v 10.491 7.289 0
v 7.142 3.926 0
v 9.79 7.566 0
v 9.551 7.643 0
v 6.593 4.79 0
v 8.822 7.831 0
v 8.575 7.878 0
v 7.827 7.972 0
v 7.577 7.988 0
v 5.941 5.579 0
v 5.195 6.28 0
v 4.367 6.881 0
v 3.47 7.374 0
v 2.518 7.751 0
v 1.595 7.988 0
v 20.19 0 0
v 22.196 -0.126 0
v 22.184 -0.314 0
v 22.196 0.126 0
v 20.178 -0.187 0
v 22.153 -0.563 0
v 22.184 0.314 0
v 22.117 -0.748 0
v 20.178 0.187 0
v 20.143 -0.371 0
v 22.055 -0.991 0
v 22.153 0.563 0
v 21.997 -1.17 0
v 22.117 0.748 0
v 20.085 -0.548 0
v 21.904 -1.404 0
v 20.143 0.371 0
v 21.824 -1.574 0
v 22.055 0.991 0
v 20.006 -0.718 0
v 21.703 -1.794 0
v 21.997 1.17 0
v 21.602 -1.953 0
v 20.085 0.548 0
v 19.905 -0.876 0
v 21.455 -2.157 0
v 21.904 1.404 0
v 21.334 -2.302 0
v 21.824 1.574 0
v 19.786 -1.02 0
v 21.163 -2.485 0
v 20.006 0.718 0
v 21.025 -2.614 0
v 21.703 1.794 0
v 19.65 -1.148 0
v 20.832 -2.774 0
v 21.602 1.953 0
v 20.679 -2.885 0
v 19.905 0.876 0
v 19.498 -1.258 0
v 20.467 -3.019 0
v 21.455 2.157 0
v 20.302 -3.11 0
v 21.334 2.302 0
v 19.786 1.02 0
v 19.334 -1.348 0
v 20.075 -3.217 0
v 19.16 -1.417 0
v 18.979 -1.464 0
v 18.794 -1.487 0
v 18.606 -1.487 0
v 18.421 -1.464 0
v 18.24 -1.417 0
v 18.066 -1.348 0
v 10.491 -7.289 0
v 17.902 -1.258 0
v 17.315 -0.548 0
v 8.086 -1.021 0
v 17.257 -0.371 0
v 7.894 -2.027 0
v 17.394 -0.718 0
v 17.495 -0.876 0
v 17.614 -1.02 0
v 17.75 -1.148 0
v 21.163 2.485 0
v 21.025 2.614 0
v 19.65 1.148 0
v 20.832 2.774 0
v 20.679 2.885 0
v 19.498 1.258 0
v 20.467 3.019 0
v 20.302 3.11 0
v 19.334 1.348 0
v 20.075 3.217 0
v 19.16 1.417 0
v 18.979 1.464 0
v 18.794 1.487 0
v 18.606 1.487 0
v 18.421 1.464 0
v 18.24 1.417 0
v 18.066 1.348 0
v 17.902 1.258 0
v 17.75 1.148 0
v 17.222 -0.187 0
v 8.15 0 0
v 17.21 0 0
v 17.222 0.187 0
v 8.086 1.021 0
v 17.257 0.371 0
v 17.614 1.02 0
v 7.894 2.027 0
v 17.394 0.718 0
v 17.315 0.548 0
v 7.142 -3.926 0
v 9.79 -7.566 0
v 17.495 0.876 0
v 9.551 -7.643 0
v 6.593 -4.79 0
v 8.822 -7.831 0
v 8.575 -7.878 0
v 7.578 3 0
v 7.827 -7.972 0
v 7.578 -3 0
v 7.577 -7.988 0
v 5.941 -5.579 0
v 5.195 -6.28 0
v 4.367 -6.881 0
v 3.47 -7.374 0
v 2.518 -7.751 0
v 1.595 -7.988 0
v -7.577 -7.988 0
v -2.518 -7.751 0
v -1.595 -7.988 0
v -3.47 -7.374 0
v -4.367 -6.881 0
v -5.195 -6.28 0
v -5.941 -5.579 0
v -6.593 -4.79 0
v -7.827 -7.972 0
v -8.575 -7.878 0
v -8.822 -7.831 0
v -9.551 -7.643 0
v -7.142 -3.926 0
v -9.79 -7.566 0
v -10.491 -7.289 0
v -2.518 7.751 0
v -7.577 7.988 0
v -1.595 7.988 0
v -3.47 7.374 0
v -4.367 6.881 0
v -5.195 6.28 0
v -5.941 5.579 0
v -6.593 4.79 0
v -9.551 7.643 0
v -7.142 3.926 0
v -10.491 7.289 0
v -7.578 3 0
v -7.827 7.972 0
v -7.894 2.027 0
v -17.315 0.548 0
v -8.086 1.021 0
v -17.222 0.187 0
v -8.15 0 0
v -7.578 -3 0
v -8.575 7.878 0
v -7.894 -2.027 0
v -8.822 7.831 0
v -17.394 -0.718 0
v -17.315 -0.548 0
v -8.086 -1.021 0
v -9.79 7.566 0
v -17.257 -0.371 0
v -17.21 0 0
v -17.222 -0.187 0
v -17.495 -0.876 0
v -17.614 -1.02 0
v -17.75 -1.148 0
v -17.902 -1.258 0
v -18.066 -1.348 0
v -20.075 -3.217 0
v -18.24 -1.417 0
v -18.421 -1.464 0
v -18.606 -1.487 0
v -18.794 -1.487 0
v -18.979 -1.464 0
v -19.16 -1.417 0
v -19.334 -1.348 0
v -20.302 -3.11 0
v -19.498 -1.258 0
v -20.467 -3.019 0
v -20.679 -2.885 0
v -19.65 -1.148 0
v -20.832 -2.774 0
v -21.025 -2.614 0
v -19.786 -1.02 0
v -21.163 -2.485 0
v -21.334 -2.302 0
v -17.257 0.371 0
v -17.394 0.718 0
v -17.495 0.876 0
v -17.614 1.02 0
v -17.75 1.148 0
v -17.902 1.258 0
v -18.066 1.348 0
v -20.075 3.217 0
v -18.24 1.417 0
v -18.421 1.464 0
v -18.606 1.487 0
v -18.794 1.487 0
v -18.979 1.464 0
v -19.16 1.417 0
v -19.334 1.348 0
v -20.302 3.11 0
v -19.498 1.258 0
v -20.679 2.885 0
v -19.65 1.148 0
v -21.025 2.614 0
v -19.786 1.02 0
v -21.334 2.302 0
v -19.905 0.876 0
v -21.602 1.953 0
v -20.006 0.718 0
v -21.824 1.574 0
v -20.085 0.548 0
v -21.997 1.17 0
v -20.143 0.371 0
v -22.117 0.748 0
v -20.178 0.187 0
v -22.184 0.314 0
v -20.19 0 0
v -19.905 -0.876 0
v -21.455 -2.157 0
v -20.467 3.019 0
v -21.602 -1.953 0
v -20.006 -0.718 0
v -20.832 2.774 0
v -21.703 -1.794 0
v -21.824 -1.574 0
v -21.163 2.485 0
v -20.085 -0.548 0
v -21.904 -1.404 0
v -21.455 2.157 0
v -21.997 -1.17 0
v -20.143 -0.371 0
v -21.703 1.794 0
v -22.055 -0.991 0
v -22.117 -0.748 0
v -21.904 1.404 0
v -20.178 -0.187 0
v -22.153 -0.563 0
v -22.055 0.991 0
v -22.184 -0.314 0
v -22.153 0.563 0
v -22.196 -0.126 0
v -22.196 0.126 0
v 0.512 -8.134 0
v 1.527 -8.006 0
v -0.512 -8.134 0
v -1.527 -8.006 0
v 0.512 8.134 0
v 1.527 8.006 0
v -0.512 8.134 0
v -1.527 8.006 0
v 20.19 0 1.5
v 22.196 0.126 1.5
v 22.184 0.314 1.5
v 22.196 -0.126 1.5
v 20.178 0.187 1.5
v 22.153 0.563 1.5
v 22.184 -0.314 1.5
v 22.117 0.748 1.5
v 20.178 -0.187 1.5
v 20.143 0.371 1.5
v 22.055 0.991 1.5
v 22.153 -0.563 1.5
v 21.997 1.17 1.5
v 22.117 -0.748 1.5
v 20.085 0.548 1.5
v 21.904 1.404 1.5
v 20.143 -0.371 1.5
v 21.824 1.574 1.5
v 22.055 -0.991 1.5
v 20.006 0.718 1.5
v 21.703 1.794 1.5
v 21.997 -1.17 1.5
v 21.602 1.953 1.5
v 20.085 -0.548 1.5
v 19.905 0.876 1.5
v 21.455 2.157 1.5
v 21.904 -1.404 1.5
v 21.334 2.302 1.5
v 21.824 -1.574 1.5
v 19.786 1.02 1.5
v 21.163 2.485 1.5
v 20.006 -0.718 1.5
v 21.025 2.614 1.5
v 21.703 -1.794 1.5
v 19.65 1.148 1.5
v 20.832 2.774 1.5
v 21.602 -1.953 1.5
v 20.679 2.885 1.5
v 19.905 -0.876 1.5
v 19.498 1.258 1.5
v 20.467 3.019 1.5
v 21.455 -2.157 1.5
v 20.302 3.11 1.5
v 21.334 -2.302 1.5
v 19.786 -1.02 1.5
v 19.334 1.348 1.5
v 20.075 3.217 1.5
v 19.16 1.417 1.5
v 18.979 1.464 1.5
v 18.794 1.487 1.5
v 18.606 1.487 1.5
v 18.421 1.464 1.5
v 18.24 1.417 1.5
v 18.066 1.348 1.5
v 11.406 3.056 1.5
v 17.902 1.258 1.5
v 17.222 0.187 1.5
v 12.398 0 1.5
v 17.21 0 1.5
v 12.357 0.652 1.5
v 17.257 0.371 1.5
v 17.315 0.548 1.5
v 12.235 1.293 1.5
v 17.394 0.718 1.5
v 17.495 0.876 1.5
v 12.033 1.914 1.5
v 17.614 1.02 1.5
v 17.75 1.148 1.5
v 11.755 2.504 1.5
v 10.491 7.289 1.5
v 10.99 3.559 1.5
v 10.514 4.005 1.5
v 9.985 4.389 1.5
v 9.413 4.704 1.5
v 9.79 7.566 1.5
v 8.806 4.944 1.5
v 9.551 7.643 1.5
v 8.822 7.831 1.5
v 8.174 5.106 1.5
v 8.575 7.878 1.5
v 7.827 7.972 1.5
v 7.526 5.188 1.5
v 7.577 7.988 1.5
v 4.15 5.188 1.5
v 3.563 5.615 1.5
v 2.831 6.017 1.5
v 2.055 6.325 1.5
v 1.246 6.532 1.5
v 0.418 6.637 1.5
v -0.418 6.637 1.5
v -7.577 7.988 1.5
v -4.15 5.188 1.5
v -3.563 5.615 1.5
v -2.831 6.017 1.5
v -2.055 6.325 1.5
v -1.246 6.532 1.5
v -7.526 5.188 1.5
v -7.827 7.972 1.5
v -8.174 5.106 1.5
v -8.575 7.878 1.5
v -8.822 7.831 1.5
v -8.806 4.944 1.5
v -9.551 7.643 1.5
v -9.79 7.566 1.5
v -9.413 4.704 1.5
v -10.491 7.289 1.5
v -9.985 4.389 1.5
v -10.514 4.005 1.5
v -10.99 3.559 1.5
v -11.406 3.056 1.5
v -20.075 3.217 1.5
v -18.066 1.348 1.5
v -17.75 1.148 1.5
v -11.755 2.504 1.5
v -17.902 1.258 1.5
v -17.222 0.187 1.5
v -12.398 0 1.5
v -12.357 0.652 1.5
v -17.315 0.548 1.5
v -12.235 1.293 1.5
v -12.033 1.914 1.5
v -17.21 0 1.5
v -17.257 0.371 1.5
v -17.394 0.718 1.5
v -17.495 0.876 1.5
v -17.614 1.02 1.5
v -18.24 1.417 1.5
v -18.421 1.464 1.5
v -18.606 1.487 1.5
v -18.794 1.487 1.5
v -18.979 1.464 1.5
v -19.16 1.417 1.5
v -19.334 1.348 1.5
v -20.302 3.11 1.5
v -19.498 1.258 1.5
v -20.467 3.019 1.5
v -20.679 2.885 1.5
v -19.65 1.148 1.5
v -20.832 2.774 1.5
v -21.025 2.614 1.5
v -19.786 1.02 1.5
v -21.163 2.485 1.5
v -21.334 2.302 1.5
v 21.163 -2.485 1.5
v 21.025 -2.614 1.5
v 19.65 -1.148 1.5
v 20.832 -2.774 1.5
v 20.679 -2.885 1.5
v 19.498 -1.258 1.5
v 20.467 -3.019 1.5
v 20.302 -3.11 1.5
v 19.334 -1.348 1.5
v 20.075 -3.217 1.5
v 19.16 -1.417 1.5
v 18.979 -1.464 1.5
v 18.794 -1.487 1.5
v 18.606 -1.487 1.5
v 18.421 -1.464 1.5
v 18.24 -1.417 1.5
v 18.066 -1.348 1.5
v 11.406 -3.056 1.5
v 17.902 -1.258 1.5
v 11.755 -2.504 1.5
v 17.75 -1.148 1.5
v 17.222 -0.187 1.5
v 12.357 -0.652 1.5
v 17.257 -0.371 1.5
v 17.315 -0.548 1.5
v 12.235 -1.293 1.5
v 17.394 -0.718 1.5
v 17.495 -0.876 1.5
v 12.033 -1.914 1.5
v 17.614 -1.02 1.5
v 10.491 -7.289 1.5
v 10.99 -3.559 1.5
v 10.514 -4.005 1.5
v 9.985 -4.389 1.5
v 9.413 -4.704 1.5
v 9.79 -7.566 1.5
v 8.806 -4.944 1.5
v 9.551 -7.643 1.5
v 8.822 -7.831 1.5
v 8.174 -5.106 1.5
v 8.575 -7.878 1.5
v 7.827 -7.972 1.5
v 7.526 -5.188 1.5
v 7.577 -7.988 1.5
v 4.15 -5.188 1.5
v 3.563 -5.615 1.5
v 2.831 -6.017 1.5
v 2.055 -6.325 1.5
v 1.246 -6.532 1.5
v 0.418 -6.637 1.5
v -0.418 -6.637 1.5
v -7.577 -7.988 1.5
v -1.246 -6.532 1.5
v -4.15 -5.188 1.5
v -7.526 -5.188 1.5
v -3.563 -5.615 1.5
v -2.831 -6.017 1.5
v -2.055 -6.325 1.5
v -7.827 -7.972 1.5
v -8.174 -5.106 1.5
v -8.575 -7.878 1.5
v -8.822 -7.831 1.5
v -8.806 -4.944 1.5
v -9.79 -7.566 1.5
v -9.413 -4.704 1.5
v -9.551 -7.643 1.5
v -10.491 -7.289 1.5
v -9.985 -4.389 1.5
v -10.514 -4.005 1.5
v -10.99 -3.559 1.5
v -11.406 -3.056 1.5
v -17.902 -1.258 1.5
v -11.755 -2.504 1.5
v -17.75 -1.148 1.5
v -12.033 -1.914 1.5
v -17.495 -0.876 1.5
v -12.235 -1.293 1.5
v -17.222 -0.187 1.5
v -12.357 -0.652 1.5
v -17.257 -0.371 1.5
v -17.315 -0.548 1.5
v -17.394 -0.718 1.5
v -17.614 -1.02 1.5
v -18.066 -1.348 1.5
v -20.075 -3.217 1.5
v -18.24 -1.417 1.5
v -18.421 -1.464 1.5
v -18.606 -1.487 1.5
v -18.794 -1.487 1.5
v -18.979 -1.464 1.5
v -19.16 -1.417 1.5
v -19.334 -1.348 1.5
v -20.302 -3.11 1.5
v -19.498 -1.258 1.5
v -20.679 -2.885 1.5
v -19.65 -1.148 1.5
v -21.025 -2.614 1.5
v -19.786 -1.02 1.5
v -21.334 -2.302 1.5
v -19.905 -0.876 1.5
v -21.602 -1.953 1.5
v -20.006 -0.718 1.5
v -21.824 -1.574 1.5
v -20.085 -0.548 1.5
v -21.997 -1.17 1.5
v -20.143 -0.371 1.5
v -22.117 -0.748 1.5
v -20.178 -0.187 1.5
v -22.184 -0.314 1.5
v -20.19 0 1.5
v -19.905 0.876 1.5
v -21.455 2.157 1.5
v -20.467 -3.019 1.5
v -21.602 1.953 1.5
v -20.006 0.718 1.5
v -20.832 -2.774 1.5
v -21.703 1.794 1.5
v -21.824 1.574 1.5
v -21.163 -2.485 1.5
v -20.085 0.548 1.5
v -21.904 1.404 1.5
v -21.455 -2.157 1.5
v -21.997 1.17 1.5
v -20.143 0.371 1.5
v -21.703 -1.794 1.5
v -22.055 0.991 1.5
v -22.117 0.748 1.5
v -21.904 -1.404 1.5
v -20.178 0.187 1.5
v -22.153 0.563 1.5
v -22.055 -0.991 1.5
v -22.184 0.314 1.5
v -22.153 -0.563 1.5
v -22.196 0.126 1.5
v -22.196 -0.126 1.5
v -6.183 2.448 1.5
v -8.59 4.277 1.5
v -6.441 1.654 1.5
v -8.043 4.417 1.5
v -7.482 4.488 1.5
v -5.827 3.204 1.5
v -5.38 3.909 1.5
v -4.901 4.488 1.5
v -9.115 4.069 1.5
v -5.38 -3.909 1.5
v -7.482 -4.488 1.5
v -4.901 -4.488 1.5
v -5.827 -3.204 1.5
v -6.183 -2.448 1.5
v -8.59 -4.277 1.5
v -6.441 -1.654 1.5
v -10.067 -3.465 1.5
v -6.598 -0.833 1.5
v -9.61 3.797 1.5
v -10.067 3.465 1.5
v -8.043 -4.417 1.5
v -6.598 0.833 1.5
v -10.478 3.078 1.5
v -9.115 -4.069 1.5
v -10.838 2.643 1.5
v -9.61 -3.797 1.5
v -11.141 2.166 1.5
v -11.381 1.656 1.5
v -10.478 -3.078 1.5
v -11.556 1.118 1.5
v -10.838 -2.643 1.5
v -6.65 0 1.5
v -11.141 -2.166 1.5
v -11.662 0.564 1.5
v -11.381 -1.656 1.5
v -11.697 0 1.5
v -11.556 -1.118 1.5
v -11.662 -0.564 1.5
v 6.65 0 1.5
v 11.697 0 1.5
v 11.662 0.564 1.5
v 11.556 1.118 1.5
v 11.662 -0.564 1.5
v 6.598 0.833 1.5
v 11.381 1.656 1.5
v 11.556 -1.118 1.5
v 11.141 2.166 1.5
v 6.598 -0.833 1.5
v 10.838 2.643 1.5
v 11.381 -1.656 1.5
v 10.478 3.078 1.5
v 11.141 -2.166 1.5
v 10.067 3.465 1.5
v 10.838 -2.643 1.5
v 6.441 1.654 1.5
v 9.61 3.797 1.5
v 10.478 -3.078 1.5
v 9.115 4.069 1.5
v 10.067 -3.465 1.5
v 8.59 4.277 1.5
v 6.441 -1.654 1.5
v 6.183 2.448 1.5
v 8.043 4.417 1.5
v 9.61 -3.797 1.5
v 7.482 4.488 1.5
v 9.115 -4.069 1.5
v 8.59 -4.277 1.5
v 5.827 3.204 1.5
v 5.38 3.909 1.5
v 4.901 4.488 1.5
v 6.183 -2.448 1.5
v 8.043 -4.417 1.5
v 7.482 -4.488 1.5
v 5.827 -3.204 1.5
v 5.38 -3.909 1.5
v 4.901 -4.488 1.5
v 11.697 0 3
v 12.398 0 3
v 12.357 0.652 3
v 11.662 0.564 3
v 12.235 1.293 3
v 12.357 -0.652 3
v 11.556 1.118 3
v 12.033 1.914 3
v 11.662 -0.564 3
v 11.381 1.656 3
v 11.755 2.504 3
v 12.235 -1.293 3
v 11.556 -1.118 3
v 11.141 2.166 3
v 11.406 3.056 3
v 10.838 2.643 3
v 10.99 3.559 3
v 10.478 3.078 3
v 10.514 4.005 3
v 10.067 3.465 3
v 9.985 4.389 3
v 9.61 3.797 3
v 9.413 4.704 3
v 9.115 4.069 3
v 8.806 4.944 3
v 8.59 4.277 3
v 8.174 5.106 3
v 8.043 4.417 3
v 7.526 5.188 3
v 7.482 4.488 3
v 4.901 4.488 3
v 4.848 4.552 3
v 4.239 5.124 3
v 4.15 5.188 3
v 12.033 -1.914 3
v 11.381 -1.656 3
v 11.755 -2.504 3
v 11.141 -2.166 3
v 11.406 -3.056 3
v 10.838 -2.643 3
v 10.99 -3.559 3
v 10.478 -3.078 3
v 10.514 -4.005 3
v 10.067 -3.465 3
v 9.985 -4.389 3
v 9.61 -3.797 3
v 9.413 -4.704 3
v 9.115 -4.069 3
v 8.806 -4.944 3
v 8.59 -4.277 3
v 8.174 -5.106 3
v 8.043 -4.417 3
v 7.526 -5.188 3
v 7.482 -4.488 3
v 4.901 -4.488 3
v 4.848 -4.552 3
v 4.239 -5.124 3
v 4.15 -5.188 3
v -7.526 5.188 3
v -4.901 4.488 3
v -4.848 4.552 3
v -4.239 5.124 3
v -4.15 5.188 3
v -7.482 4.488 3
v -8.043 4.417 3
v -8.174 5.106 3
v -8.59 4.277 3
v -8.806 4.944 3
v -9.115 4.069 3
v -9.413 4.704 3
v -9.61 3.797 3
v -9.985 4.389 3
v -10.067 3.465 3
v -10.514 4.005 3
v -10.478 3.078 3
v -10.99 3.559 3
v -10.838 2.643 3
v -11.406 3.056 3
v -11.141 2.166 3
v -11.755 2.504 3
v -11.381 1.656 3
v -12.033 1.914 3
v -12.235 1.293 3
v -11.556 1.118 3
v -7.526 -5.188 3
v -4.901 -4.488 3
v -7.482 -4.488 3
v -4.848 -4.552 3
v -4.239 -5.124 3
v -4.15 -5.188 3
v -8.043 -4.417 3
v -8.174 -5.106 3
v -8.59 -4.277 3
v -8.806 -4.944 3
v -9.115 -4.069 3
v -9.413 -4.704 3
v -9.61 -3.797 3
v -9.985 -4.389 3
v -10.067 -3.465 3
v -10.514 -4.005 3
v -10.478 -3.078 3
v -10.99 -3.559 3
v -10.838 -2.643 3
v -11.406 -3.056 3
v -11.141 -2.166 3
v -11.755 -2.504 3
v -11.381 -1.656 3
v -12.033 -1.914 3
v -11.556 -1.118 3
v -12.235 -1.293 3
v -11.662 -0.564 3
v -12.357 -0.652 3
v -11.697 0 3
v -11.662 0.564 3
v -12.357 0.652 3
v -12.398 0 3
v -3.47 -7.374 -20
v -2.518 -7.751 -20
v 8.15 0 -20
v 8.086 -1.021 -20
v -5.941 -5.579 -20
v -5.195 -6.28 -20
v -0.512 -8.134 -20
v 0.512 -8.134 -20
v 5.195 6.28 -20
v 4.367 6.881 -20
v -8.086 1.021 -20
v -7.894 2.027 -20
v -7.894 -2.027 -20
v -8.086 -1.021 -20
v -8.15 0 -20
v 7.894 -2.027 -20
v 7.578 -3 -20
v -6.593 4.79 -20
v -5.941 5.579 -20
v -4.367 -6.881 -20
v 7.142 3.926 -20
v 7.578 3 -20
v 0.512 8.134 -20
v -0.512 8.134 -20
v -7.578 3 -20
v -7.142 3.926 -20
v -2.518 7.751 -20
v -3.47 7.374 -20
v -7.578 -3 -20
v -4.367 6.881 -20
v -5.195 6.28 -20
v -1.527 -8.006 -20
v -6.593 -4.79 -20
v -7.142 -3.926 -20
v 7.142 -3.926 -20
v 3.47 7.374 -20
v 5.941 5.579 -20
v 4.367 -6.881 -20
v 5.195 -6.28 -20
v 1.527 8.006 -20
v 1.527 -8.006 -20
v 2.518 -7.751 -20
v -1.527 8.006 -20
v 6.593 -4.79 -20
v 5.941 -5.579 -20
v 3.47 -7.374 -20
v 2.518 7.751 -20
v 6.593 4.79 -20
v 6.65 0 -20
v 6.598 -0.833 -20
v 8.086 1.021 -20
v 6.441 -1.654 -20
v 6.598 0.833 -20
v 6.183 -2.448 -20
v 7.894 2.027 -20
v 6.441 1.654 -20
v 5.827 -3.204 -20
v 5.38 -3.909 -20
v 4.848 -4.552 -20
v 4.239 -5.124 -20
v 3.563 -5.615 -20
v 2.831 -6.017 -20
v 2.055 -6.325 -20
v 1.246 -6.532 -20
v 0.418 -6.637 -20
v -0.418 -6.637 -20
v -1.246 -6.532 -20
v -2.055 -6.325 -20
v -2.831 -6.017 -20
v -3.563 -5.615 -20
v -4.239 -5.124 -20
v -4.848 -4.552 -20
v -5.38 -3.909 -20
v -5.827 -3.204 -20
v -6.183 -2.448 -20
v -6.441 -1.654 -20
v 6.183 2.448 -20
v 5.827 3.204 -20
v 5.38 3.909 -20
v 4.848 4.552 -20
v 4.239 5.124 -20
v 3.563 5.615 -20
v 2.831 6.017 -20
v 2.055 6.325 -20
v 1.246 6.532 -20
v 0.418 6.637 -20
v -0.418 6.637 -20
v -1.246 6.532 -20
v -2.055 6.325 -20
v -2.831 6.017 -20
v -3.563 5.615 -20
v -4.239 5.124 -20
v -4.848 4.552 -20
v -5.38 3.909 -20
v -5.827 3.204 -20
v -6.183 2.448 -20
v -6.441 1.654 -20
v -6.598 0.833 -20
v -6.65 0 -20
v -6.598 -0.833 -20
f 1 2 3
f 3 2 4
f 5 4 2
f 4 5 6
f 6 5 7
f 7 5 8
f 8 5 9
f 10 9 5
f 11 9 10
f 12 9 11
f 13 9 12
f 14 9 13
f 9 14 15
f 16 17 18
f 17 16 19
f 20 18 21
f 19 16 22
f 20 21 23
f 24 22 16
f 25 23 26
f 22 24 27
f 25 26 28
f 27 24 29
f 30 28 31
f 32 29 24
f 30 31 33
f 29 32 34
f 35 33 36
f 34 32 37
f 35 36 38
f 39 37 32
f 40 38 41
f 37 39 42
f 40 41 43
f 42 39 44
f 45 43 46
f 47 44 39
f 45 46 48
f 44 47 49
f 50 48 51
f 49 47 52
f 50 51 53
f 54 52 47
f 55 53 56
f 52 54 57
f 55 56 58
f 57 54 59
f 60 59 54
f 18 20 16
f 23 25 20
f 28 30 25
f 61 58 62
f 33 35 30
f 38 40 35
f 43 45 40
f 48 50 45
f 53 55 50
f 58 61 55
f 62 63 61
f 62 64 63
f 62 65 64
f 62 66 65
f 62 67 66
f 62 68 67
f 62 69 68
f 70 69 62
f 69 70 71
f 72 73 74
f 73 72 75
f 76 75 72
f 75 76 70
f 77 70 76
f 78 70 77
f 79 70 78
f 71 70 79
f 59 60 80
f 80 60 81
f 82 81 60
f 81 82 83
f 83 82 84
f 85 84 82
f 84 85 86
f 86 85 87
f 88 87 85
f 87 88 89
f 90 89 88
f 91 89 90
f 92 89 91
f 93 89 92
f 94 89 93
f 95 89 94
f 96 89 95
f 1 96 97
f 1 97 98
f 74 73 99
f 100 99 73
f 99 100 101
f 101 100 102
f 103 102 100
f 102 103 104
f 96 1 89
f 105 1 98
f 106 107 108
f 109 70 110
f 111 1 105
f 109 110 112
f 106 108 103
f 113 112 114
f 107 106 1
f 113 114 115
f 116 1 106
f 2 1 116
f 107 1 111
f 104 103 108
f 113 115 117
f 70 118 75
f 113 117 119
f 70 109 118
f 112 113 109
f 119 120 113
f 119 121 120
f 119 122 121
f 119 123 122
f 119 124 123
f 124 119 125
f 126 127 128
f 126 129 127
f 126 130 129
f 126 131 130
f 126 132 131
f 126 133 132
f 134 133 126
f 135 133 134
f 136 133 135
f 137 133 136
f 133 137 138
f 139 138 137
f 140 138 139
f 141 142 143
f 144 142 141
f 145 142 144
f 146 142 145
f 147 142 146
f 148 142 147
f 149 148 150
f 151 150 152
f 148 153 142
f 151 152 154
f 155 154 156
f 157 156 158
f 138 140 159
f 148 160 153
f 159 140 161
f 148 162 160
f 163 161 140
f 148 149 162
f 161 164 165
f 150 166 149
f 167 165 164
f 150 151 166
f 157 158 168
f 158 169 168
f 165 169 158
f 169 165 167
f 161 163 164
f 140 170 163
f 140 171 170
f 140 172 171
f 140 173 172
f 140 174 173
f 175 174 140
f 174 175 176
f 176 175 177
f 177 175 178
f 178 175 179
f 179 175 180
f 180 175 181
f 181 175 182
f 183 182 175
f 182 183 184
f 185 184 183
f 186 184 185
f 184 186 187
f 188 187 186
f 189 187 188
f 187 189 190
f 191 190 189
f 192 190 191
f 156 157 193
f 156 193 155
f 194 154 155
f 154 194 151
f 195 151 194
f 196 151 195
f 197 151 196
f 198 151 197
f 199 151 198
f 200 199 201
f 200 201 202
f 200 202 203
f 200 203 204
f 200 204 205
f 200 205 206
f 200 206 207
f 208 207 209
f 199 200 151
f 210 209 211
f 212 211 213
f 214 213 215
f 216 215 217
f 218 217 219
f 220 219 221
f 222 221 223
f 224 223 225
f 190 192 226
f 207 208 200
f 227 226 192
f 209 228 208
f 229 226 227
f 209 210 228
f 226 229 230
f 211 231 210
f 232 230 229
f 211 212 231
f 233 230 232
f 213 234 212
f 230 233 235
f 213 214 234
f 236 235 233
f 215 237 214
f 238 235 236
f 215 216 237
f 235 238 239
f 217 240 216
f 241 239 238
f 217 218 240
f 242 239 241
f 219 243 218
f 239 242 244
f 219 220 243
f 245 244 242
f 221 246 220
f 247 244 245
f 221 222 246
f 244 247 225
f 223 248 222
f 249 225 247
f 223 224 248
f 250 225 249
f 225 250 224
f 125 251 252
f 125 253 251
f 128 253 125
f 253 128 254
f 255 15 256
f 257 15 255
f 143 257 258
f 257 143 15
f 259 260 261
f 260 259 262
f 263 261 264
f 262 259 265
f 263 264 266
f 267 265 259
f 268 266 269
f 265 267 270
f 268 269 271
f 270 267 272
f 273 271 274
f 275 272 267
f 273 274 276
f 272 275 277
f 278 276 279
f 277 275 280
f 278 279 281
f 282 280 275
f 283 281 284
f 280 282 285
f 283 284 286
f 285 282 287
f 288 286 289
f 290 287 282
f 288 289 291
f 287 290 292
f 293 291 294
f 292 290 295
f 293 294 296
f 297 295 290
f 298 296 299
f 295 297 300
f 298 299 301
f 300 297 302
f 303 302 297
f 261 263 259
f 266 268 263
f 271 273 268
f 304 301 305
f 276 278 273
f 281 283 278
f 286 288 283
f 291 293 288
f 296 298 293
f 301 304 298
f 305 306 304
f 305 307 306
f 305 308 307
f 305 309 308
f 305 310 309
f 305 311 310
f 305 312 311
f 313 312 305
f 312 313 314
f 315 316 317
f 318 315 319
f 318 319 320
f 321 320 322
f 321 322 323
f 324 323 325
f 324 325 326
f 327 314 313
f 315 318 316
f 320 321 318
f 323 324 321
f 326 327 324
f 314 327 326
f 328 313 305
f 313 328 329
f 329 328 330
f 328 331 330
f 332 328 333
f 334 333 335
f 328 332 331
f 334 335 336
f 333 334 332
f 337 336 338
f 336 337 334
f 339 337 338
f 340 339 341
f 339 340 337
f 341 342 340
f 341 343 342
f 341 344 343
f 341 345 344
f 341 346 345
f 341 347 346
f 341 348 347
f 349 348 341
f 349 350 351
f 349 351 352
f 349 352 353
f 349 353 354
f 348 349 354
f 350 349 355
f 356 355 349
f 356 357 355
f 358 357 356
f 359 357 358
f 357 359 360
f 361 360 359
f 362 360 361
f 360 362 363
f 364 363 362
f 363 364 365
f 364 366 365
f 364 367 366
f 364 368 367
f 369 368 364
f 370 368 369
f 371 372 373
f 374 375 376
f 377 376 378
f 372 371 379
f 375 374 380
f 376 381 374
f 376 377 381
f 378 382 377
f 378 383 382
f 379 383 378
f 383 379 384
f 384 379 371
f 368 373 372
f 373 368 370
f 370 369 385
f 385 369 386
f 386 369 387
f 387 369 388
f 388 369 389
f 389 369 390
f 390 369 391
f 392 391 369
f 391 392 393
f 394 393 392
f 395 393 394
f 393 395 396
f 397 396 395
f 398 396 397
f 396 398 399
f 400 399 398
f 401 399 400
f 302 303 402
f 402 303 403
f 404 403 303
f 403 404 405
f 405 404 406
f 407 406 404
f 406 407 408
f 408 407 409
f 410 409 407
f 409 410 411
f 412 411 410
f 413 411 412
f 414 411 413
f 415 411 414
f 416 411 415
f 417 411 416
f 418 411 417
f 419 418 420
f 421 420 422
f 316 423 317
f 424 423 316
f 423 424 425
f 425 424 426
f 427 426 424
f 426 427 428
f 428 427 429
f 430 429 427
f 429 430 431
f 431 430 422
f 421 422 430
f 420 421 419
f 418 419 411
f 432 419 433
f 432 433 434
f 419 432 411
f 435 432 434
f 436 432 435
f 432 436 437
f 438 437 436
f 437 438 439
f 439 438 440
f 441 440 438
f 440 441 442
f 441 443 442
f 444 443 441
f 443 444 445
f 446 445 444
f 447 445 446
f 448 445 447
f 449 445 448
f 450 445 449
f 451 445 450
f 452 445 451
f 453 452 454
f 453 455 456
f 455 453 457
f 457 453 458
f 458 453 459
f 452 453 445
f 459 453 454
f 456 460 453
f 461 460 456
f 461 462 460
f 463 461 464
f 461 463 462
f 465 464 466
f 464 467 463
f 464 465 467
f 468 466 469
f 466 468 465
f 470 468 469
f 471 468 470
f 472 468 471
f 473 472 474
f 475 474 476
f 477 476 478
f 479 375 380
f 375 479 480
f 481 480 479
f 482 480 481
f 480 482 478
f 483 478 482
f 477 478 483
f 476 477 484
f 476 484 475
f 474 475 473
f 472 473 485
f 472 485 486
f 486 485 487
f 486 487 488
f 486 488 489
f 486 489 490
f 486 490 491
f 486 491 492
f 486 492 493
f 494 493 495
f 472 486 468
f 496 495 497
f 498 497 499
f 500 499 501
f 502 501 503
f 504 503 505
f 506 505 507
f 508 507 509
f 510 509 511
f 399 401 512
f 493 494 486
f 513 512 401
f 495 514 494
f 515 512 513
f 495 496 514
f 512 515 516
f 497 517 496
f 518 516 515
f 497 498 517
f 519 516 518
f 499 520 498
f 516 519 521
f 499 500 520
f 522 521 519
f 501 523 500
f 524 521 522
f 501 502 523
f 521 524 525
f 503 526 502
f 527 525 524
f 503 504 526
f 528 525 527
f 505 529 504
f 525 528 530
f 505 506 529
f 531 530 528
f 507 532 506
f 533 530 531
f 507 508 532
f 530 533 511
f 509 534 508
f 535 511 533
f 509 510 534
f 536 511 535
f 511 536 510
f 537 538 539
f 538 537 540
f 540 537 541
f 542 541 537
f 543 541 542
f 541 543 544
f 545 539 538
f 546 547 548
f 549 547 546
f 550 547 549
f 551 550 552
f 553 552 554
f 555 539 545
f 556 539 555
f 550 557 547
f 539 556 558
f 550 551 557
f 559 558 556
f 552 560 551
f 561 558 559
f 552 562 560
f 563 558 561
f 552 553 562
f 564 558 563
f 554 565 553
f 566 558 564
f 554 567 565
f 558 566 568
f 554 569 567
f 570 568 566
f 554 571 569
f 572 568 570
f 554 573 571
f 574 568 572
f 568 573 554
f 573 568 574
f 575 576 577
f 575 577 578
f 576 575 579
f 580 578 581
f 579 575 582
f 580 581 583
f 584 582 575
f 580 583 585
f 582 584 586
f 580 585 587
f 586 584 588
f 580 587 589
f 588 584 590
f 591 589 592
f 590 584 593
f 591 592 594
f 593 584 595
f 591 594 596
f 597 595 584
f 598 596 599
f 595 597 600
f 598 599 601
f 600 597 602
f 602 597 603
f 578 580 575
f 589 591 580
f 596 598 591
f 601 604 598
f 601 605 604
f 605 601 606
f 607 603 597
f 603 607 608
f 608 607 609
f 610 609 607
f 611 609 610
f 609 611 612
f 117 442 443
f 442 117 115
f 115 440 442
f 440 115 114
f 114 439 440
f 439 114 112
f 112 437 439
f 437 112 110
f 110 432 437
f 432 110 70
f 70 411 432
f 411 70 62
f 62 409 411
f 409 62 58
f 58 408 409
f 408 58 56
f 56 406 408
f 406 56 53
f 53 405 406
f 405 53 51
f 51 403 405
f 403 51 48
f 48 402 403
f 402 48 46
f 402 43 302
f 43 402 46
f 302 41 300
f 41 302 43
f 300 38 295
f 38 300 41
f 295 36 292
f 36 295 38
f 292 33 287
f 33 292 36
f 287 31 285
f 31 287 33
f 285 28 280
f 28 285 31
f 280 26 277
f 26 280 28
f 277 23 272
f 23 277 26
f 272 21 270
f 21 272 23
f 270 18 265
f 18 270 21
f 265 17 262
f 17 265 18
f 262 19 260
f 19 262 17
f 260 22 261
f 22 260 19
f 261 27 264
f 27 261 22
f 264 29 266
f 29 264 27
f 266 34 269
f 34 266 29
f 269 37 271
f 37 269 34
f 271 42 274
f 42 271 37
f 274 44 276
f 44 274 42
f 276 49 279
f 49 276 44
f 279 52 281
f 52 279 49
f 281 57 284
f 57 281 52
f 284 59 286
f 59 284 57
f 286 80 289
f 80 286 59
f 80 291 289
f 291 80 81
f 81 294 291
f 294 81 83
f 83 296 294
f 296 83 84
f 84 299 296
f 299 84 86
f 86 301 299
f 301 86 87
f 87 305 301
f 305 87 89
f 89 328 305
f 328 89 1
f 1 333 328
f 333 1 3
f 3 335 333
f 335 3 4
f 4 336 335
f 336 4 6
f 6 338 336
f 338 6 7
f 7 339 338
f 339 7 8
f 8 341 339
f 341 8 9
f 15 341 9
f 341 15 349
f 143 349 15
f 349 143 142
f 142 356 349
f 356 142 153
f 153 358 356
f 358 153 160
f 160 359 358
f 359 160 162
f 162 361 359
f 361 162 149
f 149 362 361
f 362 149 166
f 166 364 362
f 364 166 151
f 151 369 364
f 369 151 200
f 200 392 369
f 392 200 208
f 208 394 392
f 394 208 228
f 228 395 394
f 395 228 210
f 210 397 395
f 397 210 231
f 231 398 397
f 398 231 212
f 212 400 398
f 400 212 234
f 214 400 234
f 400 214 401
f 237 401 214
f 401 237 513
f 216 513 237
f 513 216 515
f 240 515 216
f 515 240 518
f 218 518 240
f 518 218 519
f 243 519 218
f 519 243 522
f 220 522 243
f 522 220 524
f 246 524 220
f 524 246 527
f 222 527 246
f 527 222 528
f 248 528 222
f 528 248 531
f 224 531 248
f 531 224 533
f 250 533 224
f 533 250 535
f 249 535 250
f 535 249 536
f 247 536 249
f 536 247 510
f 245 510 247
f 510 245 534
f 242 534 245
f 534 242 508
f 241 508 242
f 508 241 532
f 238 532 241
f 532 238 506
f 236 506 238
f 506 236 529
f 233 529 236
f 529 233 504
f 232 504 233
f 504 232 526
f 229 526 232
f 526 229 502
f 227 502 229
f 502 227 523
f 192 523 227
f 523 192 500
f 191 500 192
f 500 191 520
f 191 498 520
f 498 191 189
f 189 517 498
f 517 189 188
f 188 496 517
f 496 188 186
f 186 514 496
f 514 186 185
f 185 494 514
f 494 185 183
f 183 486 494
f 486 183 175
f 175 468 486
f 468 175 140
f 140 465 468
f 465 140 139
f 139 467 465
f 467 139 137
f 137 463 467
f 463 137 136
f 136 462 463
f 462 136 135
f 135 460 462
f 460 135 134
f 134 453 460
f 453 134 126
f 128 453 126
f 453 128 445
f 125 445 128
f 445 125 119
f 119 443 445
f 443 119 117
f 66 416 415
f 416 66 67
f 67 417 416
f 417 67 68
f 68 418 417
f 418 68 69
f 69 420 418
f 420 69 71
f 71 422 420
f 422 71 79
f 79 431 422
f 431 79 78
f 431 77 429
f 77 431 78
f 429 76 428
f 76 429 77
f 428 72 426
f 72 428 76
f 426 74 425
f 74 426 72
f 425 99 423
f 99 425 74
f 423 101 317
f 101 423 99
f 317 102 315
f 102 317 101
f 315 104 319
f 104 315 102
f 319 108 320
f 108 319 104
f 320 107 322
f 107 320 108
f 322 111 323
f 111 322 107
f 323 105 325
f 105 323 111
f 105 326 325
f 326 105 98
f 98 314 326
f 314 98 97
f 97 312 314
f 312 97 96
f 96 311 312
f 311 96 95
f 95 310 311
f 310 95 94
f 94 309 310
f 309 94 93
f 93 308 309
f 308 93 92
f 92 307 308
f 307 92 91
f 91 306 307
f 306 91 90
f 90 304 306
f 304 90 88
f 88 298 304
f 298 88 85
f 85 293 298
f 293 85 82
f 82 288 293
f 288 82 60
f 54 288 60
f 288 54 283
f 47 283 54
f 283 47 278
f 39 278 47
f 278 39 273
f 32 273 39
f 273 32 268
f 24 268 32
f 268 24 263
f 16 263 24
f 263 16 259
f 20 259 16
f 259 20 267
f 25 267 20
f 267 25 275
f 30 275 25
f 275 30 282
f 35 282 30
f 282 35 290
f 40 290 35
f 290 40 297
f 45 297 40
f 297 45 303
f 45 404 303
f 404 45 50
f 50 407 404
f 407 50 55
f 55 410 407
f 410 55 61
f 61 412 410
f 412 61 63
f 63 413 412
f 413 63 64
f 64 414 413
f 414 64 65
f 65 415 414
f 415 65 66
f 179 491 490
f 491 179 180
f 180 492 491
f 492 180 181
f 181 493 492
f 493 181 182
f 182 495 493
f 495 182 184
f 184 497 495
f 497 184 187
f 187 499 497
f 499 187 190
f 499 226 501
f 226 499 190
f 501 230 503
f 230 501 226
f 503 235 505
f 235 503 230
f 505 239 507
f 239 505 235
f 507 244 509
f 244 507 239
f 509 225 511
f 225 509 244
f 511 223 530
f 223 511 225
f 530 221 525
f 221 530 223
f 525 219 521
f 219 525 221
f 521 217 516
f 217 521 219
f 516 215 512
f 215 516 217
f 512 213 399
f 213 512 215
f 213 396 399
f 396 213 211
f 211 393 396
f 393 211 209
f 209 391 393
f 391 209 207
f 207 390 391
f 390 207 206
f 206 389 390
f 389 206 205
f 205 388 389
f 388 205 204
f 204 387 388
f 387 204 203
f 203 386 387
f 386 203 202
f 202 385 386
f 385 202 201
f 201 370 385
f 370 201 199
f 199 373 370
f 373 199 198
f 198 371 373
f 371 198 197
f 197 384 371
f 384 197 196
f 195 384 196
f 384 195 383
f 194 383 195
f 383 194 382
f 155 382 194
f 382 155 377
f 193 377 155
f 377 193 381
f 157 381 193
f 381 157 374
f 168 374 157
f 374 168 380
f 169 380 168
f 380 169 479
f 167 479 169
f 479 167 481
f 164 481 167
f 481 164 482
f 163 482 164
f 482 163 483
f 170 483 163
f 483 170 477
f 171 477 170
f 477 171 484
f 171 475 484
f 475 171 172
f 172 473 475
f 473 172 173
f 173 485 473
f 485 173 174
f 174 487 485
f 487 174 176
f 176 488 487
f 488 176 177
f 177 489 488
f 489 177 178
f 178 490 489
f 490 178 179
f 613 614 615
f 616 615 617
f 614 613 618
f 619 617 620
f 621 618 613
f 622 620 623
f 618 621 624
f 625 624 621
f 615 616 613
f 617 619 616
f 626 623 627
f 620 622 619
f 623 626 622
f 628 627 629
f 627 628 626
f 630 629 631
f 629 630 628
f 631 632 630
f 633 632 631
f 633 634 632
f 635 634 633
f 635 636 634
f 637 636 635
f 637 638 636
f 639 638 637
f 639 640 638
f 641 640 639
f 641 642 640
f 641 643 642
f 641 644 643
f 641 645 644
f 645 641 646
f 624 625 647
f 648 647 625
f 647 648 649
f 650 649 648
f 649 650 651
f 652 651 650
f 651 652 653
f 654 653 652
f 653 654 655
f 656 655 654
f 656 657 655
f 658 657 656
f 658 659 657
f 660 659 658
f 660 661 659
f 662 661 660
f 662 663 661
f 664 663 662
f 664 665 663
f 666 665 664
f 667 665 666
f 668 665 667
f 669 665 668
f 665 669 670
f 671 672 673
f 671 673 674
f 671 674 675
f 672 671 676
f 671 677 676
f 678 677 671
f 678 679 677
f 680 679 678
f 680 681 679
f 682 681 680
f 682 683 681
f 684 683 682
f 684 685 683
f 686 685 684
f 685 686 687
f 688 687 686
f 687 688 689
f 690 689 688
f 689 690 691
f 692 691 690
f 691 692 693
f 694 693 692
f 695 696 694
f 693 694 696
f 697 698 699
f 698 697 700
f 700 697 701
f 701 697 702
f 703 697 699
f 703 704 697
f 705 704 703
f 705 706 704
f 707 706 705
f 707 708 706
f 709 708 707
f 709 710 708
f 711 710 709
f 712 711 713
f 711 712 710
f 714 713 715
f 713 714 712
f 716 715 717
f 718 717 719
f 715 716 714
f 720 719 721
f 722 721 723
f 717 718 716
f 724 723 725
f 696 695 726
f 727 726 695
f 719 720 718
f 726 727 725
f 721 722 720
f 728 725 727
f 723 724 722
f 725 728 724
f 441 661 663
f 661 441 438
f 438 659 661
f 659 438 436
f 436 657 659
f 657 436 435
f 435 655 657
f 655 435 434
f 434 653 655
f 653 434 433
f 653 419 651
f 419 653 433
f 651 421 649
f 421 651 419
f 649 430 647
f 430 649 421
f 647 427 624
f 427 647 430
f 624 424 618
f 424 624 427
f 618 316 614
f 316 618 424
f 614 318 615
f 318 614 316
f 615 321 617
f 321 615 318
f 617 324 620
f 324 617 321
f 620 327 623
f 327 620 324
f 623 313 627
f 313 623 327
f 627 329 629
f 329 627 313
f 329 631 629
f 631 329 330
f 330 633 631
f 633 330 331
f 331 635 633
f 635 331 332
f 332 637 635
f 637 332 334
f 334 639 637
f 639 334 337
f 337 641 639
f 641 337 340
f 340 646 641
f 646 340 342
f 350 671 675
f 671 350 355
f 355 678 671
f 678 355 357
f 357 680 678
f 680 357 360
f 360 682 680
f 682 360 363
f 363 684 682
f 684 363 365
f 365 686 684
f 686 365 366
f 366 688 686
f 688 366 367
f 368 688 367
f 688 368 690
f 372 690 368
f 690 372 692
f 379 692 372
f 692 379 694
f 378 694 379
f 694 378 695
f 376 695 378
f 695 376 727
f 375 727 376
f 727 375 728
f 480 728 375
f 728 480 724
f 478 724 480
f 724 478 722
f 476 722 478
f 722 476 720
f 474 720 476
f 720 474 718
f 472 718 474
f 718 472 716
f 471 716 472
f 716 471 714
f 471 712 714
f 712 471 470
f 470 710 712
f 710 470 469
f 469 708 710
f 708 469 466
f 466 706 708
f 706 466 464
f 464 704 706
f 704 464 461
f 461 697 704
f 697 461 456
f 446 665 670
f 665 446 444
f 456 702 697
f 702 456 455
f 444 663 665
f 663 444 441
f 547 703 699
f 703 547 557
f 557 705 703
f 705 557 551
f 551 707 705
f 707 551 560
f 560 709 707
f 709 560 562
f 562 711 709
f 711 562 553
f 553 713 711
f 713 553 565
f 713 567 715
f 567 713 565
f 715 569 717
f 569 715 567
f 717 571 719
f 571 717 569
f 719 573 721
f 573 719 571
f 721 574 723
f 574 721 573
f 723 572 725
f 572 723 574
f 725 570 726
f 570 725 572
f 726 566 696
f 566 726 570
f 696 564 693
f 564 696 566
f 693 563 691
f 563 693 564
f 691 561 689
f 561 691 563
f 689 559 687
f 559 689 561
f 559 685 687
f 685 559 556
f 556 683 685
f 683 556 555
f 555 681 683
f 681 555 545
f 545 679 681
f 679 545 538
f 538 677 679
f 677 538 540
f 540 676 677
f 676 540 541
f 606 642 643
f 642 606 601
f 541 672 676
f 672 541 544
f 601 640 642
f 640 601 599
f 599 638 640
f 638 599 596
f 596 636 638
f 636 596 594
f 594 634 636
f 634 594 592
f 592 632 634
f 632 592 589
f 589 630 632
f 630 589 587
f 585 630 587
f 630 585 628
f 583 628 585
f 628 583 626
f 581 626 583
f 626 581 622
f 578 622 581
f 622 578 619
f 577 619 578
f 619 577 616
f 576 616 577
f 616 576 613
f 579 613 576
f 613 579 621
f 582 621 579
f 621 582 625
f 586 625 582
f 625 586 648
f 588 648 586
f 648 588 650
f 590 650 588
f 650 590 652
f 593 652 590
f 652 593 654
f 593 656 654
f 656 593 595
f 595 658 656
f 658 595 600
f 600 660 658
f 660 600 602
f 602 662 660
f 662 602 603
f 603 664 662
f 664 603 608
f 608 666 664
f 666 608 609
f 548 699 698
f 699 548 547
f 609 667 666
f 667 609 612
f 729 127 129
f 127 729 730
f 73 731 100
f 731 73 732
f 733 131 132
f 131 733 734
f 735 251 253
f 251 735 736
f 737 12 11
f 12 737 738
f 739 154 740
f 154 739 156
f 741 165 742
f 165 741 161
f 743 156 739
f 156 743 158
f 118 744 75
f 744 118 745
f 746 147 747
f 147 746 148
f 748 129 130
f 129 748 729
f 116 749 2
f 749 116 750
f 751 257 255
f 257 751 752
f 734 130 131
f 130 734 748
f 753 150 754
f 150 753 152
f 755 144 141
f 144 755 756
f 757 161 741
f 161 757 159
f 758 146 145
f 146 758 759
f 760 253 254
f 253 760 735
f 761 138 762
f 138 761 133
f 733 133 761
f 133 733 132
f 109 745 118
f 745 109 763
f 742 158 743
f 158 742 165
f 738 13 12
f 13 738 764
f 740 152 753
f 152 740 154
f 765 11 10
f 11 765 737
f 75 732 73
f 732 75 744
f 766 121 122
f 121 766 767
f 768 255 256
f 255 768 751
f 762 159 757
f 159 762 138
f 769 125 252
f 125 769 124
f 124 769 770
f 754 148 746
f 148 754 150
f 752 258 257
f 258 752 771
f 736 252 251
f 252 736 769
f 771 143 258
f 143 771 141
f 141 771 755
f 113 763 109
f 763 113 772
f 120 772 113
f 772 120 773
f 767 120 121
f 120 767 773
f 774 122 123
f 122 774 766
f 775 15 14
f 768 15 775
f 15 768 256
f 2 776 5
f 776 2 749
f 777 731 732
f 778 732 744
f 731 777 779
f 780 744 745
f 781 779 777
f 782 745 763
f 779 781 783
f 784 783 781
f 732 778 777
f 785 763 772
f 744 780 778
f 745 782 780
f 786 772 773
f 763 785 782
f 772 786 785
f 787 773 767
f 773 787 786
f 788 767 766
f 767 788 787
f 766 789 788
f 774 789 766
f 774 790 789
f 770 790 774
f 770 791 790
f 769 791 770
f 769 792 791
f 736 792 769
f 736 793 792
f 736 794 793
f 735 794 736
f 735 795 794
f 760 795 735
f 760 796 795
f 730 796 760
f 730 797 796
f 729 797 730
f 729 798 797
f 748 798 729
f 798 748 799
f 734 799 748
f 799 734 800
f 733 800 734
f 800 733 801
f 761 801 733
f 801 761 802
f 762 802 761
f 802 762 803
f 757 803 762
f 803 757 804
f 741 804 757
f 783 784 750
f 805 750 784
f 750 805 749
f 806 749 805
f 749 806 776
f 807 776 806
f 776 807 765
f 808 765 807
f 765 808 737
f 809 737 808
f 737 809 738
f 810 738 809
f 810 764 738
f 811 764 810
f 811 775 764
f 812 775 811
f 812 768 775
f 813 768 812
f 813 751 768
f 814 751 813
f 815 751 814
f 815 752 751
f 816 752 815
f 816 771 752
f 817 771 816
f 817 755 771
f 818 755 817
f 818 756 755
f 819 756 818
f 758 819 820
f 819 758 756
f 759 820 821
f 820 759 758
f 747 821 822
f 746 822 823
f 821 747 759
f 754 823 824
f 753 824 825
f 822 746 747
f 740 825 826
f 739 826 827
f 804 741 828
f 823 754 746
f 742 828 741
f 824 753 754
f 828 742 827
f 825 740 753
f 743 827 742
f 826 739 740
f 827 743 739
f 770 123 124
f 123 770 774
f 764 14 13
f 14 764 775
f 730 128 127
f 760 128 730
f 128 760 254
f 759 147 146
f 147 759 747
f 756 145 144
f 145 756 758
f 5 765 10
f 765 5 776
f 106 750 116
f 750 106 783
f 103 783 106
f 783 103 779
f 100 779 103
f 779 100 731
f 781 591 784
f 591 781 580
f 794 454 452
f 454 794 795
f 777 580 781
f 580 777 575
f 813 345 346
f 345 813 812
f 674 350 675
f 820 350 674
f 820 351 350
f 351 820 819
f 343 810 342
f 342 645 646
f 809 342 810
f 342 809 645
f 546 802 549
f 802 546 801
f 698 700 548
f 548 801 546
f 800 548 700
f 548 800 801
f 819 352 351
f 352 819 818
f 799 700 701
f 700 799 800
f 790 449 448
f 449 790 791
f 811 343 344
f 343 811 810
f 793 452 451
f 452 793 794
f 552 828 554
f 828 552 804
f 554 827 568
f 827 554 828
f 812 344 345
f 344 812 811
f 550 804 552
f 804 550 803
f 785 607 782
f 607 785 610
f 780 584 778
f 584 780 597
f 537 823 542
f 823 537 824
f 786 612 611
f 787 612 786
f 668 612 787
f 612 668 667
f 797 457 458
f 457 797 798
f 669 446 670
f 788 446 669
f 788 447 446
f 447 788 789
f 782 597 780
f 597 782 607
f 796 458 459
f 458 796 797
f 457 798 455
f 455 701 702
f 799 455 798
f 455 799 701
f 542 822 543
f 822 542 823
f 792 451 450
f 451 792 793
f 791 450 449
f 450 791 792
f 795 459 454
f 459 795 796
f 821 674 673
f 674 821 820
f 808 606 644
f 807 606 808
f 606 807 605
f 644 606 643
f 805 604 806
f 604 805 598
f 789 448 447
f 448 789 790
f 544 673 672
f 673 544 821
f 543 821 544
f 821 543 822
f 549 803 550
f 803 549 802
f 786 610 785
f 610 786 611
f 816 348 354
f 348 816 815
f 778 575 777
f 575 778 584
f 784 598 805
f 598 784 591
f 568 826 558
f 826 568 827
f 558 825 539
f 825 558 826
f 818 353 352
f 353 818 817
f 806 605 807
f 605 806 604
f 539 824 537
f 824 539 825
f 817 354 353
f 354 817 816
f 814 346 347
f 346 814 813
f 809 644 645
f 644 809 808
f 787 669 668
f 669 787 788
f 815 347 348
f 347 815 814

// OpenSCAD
// file: vacuum seal.scad
include <config.scad>
use <box.scad>


module __vacuum_seal_slot() {
    spacing = vacuum_hole_diameter * 0.6;
    hull() {
        translate([-spacing, 0, 0]) {
            circle(d = vacuum_hole_diameter);
        }
        translate([spacing, 0, 0]) {
            circle(d = vacuum_hole_diameter);
        }
    }
}

module __vacuum_seal_outline() {
    spacing = vacuum_hole_diameter * 0.6;
    screw_spacing = spacing + vacuum_hole_diameter / 2 + bolt_head_clearance / 2 + 2;
    difference() {
        hull() {
            offset(2) {
                __vacuum_hole_outline();
            }
        }
        translate([screw_spacing, 0, 0]) {
            circle(d = bolt_diameter - 0.02);
        }
        translate([-screw_spacing, 0, 0]) {
            circle(d = bolt_diameter - 0.02);
        }
    }
}

module __vacuum_seal_lip() {
    spacing = vacuum_hole_diameter * 0.6;
    
    linear_extrude(3) {
        difference() {
            offset(-0.8) {
                __vacuum_seal_slot();
            }
            offset(-1.5) {
                __vacuum_seal_slot();
            }
            
        }
    }
}


module vacuum_seal() {
    linear_extrude(1.5) {
        __vacuum_seal_outline();
    }
    
    __vacuum_seal_lip();
}

vacuum_seal();
// file: box.scad
include <config.scad>
include <common.scad>


module __box_outline(size) {
    size = size == undef ? box_size : size;
    __fillet(r=fillet_radius) {
         square([size.x, size.y]);
    }
}


module __bolt_holes_outline(d, size) {
    size = size == undef ? box_size : size;
    translate([screw_post_inset, screw_post_inset]) {
        circle(d = d);
    }
    translate([size.x - screw_post_inset, screw_post_inset]) {
        circle(d = d);
    }
    translate([size.x - screw_post_inset, size.y - screw_post_inset]) {
        circle(d = d);
    }
    translate([screw_post_inset, size.y - screw_post_inset]) {
        circle(d = d);
    }
}

module __vacuum_hole_bolts_outline() {
    spacing = vacuum_hole_diameter * 0.6;
    screw_spacing = spacing + vacuum_hole_diameter / 2 + bolt_head_clearance / 2 + 2;

    translate([screw_spacing, 0, 0]) {
        circle(d = bolt_diameter);
    }
    translate([-screw_spacing, 0, 0]) {
        circle(d = bolt_diameter);
    }
}

module __vacuum_hole_outline() {
    spacing = vacuum_hole_diameter * 0.6;

    hull() {
        translate([-spacing, 0, 0]) {
            circle(d = vacuum_hole_diameter);
        }
        translate([spacing, 0, 0]) {
            circle(d = vacuum_hole_diameter);
        }
    }

    __vacuum_hole_bolts_outline();
}

module __vacuum_hole() {
    translate([box_size.x / 2, 0, box_size.z / 2]) {
        rotate([90, 0, 0]) {
            linear_extrude(wall_thickness * 2 + 0.04, center=true) {
                __vacuum_hole_outline();
            }
        }
    }
}

module __vacuum_holes() {
    __vacuum_hole();
    translate([0, box_size.y]) __vacuum_hole();
    rotate([0, 0, 90]) __vacuum_hole();
    translate([box_size.x, 0]) rotate([0, 0, 90]) __vacuum_hole();
}

module box() {
    color("MediumPurple") {
        difference() {
            union() {
                difference() {
                    // Box
                    linear_extrude(box_size.z) {
                        __box_outline();
                    }
                    // Inner void
                    translate([0, 0, floor_thickness]) {
                        linear_extrude(box_size.z) {
                            offset(r = -wall_thickness) {
                                __box_outline();
                            }
                        }
                    }
                    // Vacuum holes
                    __vacuum_holes();
                }

                // Screw posts
                linear_extrude(box_size.z) {
                    __bolt_holes_outline(screw_post_diameter);
                }
            }

            // Screw holes
            translate([0, 0, -0.02]) {
                linear_extrude(box_size.z + 0.04) {
                    difference() {
                        __bolt_holes_outline(bolt_diameter);
                    }
                }
                linear_extrude(nut_height) {
                    difference() {
                        __bolt_holes_outline(nut_diameter);
                    }
                }
            }
        }
    }
}

box();
// file: common.scad
module __fillet(r) {
   offset(r = +r) {
     offset(delta = -r) {
       children();
     }
   }
}

module __chamfer_corners(r) {
    offset(r = +r) {
        offset(delta = -r) {
            children();
        }
    }
}

module __apply_border(size) {
    translate([size, size]) {
        offset(delta = size) {
            children();
        }
    }
}
// file: config.scad
$fn = 50;

pcb_size = [130, 118, 1.6];
stencil_size = [220, 210];

box_size = [80, 80, 20];
lid_size = [240, 240];
fillet_radius = 10;
wall_thickness = 2;
floor_thickness = 1.5;
bolt_diameter = 3;
bolt_head_clearance = 7;
bolt_head_height = 2.7;
nut_diameter = 7;
nut_height = 4;
lid_thickness = 4;
lid_hole_spacing = 10;
lid_hole_diameter = 3.3;
lid_hole_border = 10;
magnet_size = [6.1, 2.1];
lift_hole_diameter = 20;
vacuum_hole_diameter = 12;
guide_hole_diameter = 4;
guide_peg_length = 15;

screw_post_diameter = bolt_head_clearance + 2;
screw_post_inset = 6.3;
// main file
include <config.scad>
include <common.scad>
use <box.scad>
use <vacuum seal.scad>

module vacuum_adapter() {
    hose_id =  13.30;
    adapter_length = 20;

    color("LightCoral") {
        difference() {
            union() {
                translate([0, 0, -adapter_length]) {
                    linear_extrude(adapter_length) {
                        circle(d=hose_id + 3);
                    }
                }
                vacuum_seal();
            }
            
            translate([0, 0, -adapter_length - 0.02]) {
                linear_extrude(adapter_length + 10) {
                    circle(d=hose_id);
                }
            }
        }
    }
}

vacuum_adapter();
